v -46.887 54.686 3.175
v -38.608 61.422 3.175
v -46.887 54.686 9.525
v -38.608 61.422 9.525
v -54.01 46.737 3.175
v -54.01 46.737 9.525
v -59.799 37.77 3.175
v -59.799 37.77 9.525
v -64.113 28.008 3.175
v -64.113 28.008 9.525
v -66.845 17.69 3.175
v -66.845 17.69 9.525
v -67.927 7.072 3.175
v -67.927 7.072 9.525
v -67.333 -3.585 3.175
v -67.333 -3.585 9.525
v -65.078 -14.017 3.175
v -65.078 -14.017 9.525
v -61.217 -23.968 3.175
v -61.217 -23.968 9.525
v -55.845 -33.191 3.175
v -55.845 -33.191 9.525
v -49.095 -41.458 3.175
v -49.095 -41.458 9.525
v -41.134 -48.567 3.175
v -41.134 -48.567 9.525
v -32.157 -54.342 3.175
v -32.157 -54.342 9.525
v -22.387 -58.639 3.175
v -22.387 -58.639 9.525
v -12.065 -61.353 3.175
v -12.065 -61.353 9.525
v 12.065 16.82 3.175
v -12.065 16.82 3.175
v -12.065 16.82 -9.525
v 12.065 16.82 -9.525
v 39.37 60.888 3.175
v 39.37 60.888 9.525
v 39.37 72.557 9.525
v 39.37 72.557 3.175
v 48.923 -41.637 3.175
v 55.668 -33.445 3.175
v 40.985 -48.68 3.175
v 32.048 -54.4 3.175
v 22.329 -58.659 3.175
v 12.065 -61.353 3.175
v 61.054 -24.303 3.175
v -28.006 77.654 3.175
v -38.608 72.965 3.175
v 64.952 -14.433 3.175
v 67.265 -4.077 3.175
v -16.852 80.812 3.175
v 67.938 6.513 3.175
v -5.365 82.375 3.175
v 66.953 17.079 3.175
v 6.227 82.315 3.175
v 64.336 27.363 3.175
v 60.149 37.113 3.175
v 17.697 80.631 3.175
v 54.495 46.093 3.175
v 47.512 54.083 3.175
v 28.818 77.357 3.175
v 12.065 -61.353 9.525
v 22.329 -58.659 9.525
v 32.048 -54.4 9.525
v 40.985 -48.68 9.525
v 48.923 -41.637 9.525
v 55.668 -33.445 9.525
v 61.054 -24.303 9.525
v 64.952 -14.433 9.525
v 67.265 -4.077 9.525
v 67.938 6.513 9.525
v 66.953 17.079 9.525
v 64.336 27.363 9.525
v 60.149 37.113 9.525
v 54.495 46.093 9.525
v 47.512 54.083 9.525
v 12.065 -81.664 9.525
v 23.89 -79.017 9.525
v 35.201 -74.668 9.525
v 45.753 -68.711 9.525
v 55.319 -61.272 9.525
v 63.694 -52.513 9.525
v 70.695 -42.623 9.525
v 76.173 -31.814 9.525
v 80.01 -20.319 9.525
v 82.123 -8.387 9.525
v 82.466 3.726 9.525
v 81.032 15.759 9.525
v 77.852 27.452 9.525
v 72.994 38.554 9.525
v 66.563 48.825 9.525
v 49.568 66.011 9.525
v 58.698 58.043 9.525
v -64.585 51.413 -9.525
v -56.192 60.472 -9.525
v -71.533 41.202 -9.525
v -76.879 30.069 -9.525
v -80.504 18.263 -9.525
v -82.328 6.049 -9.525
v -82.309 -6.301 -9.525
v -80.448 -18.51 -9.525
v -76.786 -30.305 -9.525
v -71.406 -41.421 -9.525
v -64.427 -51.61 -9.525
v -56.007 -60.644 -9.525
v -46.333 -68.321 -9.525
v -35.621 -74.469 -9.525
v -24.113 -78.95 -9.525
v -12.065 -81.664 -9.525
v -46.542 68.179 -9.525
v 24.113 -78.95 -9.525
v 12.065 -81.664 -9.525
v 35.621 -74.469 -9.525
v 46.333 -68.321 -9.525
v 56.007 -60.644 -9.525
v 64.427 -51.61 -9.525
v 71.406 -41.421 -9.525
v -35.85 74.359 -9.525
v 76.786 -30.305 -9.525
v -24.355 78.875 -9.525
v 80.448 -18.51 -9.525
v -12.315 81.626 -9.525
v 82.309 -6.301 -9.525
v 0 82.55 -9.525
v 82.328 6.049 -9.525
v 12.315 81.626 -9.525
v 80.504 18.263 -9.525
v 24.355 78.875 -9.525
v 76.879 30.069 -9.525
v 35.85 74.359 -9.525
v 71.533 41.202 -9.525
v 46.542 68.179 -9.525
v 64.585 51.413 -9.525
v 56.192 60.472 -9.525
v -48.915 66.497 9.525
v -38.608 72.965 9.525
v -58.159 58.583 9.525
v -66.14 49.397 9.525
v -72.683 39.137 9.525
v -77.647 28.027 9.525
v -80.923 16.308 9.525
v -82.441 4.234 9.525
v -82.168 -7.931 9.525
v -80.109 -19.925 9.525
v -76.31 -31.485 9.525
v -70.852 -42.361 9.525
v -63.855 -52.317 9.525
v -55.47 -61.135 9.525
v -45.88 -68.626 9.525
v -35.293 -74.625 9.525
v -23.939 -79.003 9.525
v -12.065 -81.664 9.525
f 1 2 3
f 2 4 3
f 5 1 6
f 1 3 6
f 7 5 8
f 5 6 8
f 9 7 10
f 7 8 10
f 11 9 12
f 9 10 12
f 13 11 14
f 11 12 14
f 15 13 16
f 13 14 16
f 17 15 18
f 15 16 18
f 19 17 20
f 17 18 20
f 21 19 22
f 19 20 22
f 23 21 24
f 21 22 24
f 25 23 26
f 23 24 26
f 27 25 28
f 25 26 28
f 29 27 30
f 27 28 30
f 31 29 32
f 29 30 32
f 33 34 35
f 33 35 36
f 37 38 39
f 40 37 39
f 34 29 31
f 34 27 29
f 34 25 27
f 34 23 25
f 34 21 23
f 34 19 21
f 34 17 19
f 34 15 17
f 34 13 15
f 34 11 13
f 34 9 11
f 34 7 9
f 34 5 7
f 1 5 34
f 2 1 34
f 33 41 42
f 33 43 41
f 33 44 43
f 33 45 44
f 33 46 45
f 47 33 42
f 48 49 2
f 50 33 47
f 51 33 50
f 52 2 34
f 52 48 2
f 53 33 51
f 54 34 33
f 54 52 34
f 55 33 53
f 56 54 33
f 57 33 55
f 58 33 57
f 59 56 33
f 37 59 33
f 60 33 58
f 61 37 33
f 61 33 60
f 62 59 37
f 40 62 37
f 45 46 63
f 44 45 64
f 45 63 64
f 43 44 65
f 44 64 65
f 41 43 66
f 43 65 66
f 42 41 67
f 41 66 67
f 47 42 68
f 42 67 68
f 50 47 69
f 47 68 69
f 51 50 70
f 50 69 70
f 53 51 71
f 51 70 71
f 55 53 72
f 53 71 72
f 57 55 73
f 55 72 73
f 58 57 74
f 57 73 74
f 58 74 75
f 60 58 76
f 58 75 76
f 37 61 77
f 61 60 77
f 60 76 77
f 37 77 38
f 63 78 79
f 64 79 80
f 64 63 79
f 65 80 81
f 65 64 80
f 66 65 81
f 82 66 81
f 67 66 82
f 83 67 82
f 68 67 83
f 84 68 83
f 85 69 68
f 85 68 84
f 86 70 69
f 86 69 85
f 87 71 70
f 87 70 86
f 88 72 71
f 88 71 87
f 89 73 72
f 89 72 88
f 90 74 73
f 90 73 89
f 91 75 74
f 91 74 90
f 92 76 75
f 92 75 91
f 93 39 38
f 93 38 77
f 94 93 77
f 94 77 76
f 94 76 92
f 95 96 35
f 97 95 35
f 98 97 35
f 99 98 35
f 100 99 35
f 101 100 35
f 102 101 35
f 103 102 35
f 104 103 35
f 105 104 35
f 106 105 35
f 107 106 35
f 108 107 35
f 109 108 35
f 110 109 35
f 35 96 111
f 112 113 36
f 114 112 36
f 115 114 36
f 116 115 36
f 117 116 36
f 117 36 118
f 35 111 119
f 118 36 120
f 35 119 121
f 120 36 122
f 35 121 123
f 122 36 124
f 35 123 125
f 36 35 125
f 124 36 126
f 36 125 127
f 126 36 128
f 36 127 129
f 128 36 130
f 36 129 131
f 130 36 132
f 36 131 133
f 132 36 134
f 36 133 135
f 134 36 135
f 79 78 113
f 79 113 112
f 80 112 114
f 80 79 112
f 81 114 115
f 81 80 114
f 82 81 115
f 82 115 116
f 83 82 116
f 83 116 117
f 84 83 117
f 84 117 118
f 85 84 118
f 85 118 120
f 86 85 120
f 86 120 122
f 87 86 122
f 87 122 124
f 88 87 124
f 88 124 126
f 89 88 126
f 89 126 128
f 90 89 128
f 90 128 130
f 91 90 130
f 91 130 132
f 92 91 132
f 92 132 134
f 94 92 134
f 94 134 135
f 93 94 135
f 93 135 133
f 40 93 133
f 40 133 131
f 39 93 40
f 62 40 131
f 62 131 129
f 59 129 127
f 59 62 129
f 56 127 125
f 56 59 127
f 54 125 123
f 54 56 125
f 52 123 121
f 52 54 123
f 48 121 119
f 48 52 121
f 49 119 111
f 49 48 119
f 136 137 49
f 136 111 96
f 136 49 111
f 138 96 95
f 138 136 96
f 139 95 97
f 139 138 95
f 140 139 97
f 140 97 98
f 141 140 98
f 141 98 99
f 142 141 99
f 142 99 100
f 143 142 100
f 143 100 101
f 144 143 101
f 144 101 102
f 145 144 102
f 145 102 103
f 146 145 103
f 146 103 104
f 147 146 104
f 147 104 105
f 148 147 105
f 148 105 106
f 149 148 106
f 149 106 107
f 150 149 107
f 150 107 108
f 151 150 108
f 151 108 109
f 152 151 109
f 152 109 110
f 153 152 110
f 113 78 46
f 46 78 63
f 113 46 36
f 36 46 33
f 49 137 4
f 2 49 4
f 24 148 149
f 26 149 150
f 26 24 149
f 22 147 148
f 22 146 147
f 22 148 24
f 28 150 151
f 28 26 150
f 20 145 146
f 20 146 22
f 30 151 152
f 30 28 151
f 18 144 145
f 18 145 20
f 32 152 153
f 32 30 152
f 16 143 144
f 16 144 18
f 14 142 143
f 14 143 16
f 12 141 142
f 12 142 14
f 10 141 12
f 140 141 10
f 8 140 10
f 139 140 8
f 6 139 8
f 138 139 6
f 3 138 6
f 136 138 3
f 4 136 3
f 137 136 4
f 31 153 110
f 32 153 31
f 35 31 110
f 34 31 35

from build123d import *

# Parameters (mm, degrees)
F0_R     = 82.55
F1_DEPTH = 9.525
F2_W     = 24.13
F2_H     = 99.441
F3_DEPTH = 9.525
F5_R     = 67.945
F6_DEPTH = 6.35
F8_DEPTH = 6.35


with BuildPart() as f1:
    # F0 (on Top) → F1 (new body, symmetric)
    with BuildSketch(Plane.XY):
        Circle(F0_R)
    extrude(amount=F1_DEPTH, both=True)

    # F2 (on Top) → F3 (cut, symmetric)
    with BuildSketch(Plane.XY):
        with Locations((0, -32.900974)):
            Rectangle(F2_W, F2_H)
    extrude(amount=F3_DEPTH, both=True, mode=Mode.SUBTRACT)

    # F5 (on face) → F6 (cut)
    with BuildSketch(Plane.XY.offset(9.525)):
        with Locations((0, 5.5118)):
            Circle(F5_R)
    extrude(amount=-F6_DEPTH, mode=Mode.SUBTRACT)

    # F7 (on offset) → F8 (cut)
    with BuildSketch(Plane(origin=(0, 4.112923, 9.525), x_dir=(1, 0, 0), z_dir=(0, 0, 1))):
        Polygon((39.37, 103.543088), (6.096, 103.543088), (-38.608, 103.543088), (-38.608, 52.743088), (39.37, 52.743088), align=None)
    extrude(amount=-F8_DEPTH, mode=Mode.SUBTRACT)


solid = f1.part
